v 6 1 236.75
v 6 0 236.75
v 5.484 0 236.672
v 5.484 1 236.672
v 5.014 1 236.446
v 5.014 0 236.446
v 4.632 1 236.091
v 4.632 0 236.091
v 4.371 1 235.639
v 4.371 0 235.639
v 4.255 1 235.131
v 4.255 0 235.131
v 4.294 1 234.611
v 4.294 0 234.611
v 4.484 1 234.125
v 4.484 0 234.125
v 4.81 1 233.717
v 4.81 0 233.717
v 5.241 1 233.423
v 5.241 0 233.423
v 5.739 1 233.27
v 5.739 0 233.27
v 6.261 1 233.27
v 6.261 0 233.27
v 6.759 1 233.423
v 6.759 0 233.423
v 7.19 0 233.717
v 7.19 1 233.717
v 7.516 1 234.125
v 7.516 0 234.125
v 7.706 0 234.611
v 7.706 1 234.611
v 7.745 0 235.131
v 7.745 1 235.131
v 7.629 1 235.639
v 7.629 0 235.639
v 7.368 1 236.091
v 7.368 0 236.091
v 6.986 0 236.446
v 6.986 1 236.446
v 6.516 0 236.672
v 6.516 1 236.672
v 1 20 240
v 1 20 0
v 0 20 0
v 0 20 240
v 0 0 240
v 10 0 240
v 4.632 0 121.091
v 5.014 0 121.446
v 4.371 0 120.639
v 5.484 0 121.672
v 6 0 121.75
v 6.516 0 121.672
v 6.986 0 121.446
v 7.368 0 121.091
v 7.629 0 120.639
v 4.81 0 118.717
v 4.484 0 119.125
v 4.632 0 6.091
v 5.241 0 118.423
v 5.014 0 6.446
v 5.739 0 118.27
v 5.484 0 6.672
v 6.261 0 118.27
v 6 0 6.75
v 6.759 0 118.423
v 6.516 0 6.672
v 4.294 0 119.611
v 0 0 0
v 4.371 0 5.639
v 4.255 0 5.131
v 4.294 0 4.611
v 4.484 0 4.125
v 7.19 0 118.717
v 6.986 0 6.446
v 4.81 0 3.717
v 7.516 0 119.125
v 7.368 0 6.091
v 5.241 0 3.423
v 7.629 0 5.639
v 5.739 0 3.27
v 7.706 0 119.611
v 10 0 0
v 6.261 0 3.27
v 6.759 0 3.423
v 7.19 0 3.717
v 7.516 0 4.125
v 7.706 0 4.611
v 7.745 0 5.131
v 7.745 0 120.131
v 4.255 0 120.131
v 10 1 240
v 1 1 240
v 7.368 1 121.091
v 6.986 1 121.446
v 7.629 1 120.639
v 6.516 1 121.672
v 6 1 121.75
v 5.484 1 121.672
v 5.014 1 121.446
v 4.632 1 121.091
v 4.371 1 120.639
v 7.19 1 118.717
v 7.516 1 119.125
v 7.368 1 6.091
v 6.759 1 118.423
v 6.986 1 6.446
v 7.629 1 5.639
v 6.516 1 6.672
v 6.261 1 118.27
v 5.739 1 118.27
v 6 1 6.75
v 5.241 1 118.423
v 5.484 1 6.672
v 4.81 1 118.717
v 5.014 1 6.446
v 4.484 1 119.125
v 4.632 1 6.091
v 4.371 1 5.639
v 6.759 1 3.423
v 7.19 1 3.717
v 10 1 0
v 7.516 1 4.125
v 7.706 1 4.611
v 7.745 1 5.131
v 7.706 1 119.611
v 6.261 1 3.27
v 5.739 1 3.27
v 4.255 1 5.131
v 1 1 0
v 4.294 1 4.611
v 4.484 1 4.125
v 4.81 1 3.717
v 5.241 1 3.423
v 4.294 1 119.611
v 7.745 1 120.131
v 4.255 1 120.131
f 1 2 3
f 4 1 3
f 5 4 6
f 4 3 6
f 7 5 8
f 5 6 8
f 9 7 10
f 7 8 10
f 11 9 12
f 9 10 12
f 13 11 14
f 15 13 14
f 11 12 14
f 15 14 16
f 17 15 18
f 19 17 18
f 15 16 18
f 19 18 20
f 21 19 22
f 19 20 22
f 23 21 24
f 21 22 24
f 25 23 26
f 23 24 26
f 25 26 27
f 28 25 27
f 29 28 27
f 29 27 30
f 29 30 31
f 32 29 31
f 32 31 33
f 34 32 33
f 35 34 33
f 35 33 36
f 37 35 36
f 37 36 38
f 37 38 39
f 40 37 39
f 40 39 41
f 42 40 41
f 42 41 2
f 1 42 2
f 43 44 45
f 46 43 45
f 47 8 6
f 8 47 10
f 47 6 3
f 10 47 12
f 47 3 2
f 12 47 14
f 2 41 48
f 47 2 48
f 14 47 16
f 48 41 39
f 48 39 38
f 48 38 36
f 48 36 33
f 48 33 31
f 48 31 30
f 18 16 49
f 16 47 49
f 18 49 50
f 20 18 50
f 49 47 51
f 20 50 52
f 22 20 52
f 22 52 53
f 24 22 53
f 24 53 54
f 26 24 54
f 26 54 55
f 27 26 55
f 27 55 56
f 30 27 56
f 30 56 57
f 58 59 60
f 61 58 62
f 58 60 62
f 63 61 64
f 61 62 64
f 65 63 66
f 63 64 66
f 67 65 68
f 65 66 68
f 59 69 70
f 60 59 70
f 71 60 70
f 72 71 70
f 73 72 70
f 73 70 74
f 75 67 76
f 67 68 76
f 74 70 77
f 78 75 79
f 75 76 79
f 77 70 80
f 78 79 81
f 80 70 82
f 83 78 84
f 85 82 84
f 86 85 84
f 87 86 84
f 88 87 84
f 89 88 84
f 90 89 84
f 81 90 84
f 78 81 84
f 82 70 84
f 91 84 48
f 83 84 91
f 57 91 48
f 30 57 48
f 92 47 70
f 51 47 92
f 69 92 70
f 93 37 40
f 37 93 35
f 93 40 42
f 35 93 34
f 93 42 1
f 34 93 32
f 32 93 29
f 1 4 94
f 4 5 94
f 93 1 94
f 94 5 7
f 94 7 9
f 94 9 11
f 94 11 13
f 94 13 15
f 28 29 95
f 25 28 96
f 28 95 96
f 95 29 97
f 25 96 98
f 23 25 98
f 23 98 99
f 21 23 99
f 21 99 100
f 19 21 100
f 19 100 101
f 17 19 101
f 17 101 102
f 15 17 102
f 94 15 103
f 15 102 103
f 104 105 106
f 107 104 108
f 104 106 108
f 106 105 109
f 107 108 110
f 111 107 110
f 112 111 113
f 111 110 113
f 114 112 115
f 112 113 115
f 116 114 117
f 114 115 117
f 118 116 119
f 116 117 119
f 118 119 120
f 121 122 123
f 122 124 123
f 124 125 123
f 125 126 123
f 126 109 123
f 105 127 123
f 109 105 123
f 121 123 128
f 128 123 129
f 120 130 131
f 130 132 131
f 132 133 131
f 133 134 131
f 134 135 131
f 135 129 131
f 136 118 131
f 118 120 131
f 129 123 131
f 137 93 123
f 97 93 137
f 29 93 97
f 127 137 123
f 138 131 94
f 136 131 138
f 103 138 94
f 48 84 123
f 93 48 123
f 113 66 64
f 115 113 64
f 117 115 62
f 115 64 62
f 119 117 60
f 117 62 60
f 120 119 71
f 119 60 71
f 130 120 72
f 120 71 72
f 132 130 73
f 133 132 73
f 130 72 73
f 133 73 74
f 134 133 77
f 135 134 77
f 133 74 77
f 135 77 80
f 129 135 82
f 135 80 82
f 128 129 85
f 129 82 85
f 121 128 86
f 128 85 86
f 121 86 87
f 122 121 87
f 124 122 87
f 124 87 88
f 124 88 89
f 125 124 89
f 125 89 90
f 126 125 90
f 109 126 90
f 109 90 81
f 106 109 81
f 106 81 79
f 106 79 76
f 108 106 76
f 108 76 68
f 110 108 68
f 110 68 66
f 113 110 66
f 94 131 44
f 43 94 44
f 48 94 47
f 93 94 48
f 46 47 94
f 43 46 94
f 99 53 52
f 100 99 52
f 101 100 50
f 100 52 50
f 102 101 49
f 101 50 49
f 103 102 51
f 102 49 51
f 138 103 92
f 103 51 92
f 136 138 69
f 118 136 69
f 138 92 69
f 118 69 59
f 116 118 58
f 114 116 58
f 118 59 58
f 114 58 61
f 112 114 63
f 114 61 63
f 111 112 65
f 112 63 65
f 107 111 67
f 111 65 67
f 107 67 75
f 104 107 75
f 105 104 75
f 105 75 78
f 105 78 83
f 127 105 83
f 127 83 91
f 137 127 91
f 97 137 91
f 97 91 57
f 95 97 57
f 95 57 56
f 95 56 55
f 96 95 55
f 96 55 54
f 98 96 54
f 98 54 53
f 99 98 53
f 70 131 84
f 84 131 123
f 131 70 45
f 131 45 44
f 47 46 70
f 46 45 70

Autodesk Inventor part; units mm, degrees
ref_plane "YZ Plane" through (0, 0, 0) normal (1, 0, 0) x (0, 1, 0)
ref_plane "XZ Plane" through (0, 0, 0) normal (0, 1, 0) x (-1, 0, 0)
ref_plane "XY Plane" through (0, 0, 0) normal (0, 0, 1) x (1, 0, 0)
sketch "スケッチ2" plane through (0, 0, 0) normal (0, 0, 1) x (1, 0, 0)
  line L0 (0, 0) -> (10, 0)
  line L1 (10, 0) -> (10, 1)
  line L2 (10, 1) -> (0, 1)
  line L3 (0, 1) -> (0, 0)
  line L4 (0, 0) -> (1, 0)
  line L5 (1, 0) -> (1, 20)
  line L6 (1, 20) -> (0, 20)
  line L7 (0, 20) -> (0, 0)
  point P0 (1, 1)
  dimension "d0" = 10
  dimension "d1" = 1
  dimension "d2" = 1
  dimension "d3" = 20
extrude "押し出し1" add sketch "スケッチ2" along normal blind 240
sketch "スケッチ3" plane through (1, 1, 0) normal (0, 1, 0) x (1, 0, 0)
  line L0 (9, 0) -> (0, 0) projected
  line L1 (0, 0) -> (0, -240) projected
  line L2 (9, 0) -> (9, -240) projected
  line L3 (9, 0) -> (9, -240) projected
  line L4 (9, -240) -> (0, -240) projected
  point P0 (-1, 0)
  point P1 (5, -235)
  point P2 (5, -120)
  point P3 (5, -5)
  point P4 (9, -120)
  dimension "d13" = 5
  dimension "d15" = 4
  dimension "d16" = 0
  dimension "d17" = 4
  dimension "d18" = 5
  dimension "d19" = 4
hole "穴1" at (6, 1, 235) at (6, 1, 120) at (6, 1, 5) direction (0, -1, 0) diameter 3.5 end through all
properties part number "slide_panel_back_stopper"
